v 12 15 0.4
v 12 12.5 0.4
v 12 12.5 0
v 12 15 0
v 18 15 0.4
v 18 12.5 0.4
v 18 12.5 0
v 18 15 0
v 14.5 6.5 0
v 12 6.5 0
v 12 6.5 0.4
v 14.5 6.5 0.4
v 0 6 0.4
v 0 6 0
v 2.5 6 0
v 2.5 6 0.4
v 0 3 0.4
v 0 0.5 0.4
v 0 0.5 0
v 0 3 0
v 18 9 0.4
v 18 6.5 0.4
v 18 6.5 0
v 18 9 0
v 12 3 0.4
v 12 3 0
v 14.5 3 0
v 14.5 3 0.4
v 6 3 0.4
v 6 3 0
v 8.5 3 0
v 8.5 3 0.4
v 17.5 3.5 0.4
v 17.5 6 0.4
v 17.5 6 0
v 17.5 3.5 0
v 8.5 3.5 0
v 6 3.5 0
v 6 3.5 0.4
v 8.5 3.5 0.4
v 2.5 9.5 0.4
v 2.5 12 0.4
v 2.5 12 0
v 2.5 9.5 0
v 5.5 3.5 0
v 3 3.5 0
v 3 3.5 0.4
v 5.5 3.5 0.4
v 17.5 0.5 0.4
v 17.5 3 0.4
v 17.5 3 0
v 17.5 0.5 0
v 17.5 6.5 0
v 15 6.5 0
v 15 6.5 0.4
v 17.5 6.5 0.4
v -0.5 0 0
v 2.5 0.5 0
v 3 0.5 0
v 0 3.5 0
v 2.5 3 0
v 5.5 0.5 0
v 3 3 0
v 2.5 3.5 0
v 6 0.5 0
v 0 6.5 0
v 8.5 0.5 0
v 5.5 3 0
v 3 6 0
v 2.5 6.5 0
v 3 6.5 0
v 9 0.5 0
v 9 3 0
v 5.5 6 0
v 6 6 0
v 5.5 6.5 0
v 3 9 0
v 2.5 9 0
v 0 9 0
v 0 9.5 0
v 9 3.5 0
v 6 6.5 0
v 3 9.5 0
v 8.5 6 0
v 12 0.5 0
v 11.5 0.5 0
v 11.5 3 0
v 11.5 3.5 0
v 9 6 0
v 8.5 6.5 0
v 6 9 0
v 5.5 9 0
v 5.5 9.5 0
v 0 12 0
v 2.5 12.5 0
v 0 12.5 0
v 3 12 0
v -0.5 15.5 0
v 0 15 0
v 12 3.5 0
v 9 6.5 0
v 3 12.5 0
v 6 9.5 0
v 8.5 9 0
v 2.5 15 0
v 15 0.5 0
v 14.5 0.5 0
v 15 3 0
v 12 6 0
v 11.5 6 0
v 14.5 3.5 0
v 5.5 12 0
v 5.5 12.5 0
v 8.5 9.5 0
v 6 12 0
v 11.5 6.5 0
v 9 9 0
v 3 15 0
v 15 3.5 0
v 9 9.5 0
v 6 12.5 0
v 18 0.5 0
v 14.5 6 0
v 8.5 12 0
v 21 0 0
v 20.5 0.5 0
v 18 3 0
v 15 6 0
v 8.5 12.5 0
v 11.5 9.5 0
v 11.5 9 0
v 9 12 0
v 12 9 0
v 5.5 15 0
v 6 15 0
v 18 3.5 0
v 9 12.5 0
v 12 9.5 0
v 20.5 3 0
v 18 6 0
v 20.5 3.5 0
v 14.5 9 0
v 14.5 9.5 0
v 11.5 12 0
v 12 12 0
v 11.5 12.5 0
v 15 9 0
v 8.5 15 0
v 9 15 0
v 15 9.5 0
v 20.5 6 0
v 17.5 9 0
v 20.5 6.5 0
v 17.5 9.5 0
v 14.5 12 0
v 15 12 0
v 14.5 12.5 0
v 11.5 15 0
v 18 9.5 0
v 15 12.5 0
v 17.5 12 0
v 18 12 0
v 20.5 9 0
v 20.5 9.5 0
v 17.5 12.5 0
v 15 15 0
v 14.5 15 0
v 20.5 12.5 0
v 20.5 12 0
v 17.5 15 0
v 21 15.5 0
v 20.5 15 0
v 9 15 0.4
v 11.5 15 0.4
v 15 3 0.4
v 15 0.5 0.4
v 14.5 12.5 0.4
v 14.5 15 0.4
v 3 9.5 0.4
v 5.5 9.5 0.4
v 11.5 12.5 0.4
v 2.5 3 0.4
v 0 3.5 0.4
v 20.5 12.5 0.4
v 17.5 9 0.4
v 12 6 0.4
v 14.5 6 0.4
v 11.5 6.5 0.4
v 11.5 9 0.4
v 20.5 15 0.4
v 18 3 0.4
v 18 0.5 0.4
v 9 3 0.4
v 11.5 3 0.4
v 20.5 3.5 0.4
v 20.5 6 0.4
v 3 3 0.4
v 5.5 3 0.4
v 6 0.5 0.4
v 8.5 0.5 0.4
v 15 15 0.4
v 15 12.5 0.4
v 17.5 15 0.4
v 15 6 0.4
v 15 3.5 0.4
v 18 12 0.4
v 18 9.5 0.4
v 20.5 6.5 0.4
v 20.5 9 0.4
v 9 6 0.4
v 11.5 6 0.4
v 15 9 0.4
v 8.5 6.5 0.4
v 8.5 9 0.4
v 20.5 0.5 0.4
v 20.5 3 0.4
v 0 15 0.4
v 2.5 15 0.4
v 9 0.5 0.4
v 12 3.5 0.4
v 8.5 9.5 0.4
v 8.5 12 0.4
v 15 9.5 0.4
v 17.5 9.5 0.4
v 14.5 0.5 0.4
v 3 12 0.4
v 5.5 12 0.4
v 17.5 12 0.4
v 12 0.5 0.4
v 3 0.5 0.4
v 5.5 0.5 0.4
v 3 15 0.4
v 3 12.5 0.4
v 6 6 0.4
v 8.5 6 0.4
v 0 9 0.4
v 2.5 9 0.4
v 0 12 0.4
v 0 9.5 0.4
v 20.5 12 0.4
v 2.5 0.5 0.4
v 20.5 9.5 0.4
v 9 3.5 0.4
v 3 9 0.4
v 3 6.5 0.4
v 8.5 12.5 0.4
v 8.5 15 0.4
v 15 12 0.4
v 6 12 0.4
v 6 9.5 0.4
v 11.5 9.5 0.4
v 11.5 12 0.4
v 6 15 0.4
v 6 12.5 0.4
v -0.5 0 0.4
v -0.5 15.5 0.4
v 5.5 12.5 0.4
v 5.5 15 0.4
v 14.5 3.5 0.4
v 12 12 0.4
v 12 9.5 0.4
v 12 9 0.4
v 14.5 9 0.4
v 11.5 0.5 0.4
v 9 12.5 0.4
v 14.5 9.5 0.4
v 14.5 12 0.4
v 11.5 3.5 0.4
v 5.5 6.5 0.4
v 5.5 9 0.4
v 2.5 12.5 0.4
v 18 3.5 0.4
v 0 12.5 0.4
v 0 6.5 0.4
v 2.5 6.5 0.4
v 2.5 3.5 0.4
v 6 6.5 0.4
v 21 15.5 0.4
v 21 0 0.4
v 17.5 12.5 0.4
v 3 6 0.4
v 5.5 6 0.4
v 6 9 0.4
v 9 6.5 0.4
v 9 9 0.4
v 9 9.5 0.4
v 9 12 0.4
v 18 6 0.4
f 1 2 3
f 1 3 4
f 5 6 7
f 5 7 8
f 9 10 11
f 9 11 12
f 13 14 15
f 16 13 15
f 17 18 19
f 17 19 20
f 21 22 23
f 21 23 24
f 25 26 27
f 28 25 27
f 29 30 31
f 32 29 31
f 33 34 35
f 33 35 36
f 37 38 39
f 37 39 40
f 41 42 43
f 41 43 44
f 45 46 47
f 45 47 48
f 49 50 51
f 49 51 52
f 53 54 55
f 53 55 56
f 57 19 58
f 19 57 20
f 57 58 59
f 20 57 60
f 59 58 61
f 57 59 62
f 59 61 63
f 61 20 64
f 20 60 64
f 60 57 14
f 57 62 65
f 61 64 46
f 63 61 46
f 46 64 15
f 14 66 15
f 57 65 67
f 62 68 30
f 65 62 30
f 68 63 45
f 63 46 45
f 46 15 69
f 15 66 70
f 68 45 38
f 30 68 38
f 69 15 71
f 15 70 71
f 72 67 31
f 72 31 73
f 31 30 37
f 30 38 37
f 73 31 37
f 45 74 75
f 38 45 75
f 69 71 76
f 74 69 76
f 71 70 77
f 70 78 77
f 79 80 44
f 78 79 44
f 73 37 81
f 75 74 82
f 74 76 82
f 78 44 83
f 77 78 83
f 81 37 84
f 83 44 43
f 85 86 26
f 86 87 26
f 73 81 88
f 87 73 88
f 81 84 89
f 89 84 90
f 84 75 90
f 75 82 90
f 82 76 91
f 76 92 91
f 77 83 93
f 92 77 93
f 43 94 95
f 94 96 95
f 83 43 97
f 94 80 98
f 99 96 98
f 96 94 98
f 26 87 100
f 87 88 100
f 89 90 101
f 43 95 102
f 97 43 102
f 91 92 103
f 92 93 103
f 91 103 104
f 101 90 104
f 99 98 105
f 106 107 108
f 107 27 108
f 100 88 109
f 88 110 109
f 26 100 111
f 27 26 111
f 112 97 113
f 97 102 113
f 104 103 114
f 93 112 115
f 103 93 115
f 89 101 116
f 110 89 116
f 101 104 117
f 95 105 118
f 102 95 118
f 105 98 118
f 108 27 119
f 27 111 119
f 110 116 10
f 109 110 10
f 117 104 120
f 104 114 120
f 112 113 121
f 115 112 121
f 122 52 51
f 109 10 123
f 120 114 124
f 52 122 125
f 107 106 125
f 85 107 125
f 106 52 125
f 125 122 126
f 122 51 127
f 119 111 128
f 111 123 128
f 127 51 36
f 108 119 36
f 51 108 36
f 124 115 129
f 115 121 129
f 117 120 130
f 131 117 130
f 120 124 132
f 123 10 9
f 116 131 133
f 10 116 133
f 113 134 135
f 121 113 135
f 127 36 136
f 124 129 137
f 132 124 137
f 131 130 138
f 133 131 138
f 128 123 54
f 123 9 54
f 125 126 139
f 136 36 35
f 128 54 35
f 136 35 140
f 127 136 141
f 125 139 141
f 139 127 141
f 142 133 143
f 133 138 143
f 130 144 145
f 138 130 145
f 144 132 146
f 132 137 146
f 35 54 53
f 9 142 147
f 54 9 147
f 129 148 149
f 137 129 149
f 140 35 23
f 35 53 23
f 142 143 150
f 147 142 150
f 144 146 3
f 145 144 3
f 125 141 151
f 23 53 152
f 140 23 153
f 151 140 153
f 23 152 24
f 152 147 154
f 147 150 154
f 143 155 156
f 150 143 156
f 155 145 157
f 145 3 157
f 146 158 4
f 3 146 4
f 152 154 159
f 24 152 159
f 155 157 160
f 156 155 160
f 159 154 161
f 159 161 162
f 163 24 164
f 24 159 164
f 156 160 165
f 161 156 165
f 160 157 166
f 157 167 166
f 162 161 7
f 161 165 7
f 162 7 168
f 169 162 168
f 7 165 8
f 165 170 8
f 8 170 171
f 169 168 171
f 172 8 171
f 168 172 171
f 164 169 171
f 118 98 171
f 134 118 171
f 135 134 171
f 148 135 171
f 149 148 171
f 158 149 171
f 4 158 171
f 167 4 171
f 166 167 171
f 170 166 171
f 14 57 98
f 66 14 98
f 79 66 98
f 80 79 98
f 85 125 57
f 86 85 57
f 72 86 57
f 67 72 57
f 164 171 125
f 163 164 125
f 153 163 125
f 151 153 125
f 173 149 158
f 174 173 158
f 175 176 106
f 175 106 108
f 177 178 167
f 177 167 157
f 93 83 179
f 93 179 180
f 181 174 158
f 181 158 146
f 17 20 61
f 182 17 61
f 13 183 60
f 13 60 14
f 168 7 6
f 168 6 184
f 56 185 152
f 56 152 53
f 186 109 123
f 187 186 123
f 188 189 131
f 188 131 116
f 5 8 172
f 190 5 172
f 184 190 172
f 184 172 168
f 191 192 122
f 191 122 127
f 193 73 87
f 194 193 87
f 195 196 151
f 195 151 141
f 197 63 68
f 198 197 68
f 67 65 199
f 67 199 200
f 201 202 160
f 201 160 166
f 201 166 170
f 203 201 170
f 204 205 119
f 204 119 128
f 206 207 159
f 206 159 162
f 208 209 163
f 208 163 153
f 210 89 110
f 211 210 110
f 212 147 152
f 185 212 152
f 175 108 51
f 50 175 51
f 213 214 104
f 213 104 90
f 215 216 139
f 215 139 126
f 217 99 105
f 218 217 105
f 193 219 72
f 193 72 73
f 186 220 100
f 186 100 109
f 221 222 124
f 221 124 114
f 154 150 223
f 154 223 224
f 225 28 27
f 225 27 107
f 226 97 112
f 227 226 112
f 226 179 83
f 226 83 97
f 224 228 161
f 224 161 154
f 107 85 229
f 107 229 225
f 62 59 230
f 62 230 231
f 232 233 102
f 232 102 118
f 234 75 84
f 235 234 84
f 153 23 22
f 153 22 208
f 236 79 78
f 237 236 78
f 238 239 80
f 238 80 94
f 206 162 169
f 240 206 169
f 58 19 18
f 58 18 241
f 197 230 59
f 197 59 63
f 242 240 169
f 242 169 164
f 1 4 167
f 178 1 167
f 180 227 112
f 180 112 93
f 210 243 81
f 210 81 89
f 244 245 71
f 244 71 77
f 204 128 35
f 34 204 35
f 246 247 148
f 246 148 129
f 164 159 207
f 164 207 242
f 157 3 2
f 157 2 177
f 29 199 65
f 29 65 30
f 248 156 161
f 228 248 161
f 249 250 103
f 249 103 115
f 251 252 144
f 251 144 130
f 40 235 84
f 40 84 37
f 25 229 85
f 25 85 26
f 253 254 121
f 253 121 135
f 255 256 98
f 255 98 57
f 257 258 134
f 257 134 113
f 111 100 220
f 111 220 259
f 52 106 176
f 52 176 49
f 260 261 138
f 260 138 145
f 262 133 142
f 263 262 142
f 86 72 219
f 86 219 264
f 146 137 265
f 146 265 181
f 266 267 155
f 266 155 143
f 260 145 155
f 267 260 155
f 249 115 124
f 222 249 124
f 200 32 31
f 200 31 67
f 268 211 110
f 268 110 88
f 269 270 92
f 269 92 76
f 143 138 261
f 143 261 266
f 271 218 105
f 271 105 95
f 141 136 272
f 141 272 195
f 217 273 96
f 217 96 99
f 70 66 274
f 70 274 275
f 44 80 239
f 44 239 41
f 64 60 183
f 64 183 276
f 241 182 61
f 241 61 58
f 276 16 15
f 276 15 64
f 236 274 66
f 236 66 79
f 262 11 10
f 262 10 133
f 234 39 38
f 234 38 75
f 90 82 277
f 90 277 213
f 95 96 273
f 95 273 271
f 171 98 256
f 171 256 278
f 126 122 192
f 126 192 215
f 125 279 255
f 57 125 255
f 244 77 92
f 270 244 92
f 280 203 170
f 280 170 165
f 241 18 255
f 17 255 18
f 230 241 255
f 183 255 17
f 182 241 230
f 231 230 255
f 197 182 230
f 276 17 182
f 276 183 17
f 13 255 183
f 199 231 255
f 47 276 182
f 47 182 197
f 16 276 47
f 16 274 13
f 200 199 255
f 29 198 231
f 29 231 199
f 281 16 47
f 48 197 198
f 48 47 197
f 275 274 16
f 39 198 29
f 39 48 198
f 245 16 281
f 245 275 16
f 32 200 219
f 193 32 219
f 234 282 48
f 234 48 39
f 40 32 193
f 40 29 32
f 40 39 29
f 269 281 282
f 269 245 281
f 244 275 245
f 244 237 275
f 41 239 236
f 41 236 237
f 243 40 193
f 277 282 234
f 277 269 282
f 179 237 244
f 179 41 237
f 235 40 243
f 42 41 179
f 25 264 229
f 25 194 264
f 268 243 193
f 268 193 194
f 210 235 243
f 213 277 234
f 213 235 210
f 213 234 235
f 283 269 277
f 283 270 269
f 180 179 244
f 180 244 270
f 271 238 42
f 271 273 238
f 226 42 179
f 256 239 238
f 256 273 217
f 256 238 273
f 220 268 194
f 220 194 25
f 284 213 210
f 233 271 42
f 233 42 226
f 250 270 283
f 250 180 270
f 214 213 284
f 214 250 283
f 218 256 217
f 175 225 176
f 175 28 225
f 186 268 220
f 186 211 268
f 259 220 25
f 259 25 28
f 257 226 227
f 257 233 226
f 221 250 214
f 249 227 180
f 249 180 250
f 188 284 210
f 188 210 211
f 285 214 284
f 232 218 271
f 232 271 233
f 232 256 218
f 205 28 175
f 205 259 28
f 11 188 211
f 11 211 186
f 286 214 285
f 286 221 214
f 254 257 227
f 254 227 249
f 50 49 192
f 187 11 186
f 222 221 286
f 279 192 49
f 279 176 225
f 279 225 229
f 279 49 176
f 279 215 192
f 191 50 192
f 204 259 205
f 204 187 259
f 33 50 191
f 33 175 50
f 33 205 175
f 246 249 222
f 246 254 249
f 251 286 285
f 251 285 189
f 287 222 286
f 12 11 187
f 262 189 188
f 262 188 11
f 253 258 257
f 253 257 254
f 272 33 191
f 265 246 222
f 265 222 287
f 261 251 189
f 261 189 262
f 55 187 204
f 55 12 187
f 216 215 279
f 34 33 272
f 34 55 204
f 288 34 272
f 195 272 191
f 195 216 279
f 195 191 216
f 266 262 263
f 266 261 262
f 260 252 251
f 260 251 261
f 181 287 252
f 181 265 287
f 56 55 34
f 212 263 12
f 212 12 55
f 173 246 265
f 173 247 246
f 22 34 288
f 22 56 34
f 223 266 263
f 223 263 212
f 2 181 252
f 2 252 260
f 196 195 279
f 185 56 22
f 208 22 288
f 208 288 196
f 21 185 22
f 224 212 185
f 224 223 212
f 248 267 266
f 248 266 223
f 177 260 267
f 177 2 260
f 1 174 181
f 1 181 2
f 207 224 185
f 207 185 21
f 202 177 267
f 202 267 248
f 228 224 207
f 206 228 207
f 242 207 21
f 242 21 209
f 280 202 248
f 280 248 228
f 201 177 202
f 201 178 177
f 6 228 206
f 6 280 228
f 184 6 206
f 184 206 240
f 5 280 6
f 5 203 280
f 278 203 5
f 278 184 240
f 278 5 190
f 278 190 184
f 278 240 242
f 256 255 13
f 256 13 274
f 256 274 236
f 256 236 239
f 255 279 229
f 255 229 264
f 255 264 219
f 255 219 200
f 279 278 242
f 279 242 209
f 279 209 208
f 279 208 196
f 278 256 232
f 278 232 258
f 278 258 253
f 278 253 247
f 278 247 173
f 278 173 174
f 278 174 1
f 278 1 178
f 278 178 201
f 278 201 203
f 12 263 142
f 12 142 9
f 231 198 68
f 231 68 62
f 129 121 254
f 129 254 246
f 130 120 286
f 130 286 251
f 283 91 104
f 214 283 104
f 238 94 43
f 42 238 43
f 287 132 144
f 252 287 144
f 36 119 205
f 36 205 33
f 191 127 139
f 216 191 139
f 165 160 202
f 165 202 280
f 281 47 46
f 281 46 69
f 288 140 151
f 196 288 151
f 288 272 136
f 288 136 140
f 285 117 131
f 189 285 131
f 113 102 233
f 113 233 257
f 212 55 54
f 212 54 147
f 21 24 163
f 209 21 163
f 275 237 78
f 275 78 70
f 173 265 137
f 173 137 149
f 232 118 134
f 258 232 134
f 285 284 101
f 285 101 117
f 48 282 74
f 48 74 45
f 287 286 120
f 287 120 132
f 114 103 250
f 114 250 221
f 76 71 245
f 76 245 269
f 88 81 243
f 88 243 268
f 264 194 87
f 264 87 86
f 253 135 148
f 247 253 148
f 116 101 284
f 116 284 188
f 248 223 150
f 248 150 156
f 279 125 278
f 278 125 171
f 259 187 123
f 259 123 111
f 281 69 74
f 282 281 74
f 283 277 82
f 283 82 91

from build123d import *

# Parameters (mm, degrees)
SKETCH_1_W             = 21
SKETCH_1_H             = 0.5
EXTRUDE_1_DEPTH        = 0.4
PATTERN_LINEAR_1_COUNT = 6
PATTERN_LINEAR_1_PITCH = 3
EXTRUDE_3_DEPTH        = 0.4
PATTERN_LINEAR_2_COUNT = 8
PATTERN_LINEAR_2_PITCH = 3


with BuildPart() as part:
    # 草图1 → 凸台-拉伸1 (new body)
    with BuildSketch(Plane.XY):
        with Locations((10.5, 0.25)):
            Rectangle(SKETCH_1_W, SKETCH_1_H)
    extrude(amount=EXTRUDE_1_DEPTH)


with BuildPart() as pattern_linear_1_1:
    # 阵列(线性)1: pattern copy
    add(part.part.moved(Location(Vector(0, 1, 0) * (1 * PATTERN_LINEAR_1_PITCH))))


with BuildPart() as pattern_linear_1_2:
    # 阵列(线性)1: pattern copy
    add(part.part.moved(Location(Vector(0, 1, 0) * (2 * PATTERN_LINEAR_1_PITCH))))


with BuildPart() as pattern_linear_1_3:
    # 阵列(线性)1: pattern copy
    add(part.part.moved(Location(Vector(0, 1, 0) * (3 * PATTERN_LINEAR_1_PITCH))))


with BuildPart() as pattern_linear_1_4:
    # 阵列(线性)1: pattern copy
    add(part.part.moved(Location(Vector(0, 1, 0) * (4 * PATTERN_LINEAR_1_PITCH))))


with BuildPart() as pattern_linear_1_5:
    # 阵列(线性)1: pattern copy
    add(part.part.moved(Location(Vector(0, 1, 0) * (5 * PATTERN_LINEAR_1_PITCH))))


with BuildPart() as part_1:
    add(part.part)

    add(pattern_linear_1_1.part)  # 凸台-拉伸3 merges 阵列(线性)1_1

    add(pattern_linear_1_2.part)  # 凸台-拉伸3 merges 阵列(线性)1_2

    add(pattern_linear_1_3.part)  # 凸台-拉伸3 merges 阵列(线性)1_3
    # 草图3 → 凸台-拉伸3 (add)
    with BuildSketch(Plane.XY.offset(0.4)):
        Polygon((0, 15.5), (0, 9.5), (0, 0), (-0.5, 0), (-0.5, 10.98507125), (-0.5, 15.5), align=None)
    extrude_3 = extrude(amount=-EXTRUDE_3_DEPTH)

    # 阵列(线性)2: 凸台-拉伸3 ×8
    with Locations(*[(i * PATTERN_LINEAR_2_PITCH, 0, 0) for i in range(1, PATTERN_LINEAR_2_COUNT)]):
        add(extrude_3)

    # Combine 1: read off the stored shape, not the designer's step
    # Combine 1: union 阵列(线性)1_4, 阵列(线性)1_5
    add(pattern_linear_1_4.part)
    add(pattern_linear_1_5.part)


solid = part_1.part
